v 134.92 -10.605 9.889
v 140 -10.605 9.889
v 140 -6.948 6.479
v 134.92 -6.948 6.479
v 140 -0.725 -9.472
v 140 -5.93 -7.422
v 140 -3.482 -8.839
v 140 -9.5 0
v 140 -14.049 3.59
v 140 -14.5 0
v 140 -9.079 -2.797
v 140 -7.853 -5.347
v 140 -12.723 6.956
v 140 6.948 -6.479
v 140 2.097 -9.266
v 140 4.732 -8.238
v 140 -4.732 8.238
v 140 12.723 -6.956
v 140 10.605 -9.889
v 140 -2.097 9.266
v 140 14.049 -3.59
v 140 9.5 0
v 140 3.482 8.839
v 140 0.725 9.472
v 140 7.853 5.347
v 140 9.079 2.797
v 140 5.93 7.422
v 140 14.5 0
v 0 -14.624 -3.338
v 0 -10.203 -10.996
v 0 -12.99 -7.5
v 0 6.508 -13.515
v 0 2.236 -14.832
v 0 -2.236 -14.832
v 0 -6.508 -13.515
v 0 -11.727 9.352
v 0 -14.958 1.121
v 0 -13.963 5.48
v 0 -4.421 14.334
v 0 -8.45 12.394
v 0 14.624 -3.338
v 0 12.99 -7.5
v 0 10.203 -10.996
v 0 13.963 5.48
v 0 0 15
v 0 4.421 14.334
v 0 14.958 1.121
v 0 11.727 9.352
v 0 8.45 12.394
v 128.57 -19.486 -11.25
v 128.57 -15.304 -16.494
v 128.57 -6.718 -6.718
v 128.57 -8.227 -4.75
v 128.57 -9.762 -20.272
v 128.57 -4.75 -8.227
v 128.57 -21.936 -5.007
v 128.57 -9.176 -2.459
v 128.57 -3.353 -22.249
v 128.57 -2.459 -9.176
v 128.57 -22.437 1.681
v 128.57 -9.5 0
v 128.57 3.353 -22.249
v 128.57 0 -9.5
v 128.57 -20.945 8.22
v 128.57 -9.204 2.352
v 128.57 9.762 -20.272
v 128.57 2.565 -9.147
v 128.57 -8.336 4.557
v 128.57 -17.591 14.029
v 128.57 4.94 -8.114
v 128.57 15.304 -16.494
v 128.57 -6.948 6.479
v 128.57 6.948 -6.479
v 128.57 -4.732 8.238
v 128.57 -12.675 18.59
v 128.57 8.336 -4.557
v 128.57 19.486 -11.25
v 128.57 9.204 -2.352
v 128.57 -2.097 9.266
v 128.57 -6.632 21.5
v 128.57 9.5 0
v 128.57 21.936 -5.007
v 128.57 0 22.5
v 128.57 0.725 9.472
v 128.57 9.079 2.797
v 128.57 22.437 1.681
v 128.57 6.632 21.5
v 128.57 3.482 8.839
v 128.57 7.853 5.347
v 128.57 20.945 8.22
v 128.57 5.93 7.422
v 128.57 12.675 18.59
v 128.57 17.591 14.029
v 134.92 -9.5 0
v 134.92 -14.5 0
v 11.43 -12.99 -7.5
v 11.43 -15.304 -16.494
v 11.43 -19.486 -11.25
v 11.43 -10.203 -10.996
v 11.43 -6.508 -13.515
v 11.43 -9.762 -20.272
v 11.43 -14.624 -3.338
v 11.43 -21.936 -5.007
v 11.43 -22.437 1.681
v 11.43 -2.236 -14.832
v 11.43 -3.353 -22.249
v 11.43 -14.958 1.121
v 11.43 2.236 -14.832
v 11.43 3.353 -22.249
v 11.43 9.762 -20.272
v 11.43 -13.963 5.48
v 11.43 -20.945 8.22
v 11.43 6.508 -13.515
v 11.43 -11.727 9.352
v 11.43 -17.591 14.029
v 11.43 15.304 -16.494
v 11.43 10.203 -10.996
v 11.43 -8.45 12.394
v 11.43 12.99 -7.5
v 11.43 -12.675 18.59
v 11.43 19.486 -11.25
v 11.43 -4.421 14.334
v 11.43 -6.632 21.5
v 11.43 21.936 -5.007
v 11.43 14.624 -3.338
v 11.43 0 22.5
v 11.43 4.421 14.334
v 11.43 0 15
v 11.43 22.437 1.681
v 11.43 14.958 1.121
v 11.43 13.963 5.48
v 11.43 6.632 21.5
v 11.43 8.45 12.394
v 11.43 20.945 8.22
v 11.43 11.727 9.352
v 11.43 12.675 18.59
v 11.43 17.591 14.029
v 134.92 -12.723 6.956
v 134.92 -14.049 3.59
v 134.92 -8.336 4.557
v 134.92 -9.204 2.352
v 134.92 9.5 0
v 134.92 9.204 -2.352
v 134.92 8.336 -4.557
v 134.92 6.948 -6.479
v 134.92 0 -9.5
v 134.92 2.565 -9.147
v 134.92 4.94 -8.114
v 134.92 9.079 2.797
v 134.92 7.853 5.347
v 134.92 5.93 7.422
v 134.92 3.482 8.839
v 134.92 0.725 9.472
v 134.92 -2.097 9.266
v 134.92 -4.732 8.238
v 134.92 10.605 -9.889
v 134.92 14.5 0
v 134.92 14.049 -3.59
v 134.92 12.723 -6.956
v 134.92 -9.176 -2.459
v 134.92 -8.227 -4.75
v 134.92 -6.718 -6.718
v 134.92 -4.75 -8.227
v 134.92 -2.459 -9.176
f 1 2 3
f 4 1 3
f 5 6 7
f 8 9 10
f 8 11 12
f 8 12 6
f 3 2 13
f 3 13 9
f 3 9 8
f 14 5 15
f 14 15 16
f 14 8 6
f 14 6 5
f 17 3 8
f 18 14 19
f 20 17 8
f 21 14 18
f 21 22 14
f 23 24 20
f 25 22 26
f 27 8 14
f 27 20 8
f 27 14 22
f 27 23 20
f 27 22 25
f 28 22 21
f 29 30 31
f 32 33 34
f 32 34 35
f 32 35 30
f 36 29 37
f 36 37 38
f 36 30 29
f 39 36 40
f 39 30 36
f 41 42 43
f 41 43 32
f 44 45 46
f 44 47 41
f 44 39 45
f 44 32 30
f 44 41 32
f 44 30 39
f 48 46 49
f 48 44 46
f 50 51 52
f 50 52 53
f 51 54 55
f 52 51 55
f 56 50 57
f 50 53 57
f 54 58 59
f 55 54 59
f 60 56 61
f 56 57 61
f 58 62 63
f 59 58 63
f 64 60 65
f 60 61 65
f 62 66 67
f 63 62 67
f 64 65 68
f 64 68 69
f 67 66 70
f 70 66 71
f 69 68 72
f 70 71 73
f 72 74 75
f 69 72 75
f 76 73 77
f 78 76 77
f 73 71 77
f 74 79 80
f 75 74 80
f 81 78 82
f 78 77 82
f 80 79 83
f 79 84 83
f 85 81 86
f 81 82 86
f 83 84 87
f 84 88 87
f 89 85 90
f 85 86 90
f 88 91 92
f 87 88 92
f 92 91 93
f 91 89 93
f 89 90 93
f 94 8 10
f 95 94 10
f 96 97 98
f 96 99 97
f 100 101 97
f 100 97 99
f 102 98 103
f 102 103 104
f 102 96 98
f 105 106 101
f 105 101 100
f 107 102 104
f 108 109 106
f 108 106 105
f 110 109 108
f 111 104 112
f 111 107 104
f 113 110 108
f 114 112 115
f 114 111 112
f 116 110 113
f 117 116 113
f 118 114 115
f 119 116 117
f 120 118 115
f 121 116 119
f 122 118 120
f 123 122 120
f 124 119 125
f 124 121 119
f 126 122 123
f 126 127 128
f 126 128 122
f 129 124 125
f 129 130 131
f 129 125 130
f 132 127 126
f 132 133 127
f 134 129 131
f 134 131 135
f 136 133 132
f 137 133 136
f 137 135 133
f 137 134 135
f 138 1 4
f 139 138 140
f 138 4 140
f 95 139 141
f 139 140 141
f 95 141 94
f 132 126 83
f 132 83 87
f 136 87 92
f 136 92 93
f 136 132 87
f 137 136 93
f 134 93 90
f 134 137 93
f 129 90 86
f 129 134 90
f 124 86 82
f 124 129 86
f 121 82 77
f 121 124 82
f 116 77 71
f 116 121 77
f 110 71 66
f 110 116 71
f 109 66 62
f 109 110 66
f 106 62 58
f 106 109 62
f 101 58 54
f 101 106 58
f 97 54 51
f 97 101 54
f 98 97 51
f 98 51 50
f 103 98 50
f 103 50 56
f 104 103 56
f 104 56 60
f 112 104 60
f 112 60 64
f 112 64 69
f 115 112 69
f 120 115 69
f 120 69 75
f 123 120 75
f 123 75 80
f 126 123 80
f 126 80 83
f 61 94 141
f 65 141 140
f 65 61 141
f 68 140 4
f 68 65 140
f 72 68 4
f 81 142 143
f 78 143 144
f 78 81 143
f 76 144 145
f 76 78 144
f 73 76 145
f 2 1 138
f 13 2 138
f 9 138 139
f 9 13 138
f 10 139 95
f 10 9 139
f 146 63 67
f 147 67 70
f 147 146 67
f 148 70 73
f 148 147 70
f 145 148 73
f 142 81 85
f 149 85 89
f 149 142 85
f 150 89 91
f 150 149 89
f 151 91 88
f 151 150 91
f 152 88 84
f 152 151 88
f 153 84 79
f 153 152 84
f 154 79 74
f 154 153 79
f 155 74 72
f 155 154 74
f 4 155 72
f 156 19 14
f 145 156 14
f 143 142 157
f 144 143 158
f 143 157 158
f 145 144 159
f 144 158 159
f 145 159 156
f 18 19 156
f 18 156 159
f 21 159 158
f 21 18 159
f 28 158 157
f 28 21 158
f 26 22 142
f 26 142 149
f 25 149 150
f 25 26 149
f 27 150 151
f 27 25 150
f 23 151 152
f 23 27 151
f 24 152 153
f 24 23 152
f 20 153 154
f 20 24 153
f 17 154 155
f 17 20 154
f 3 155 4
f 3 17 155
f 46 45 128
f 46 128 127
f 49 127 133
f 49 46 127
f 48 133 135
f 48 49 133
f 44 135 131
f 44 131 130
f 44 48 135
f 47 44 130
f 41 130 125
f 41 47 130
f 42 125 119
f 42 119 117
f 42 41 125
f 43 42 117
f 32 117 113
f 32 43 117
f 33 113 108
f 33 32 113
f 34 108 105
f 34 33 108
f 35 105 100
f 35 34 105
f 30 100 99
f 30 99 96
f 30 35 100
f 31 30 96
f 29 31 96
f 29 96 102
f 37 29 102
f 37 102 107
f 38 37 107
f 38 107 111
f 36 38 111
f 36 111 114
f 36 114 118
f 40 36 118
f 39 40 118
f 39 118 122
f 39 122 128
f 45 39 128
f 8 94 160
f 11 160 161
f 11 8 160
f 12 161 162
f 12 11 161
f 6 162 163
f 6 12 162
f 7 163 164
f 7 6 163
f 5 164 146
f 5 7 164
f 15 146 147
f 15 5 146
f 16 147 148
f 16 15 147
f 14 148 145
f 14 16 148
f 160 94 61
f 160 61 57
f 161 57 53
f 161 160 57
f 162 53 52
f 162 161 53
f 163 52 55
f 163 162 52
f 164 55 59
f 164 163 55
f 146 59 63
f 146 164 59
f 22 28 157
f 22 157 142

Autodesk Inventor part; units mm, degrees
ref_plane "YZ Plane" through (0, 0, 0) normal (1, 0, 0) x (0, 1, 0)
ref_plane "XZ Plane" through (0, 0, 0) normal (0, 1, 0) x (-1, 0, 0)
ref_plane "XY Plane" through (0, 0, 0) normal (0, 0, 1) x (1, 0, 0)
sketch "Sketch1" plane through (0, 0, 0) normal (1, 0, 0) x (0, 1, 0)
  circle A0 centre (0, 0) radius 15
  dimension "d0" = 30
extrude "Extrusion1" add sketch "Sketch1" along normal blind 140
sketch "Sketch2" plane through (140, 0, 0) normal (1, 0, 0) x (0, 0, -1)
  circle A0 centre (0, 0) radius 9.5
  circle A1 centre (0, 0) radius 15 projected
  line L0 (0, 15) -> (0, 9.5)
  line L1 (0, -9.5) -> (0, -15)
  line L2 (10.23, 10.9703) -> (6.479, 6.9479)
  line L3 (-10.23, -10.9703) -> (-6.479, -6.9479)
  dimension "d3" = 19
  dimension "d4" = 43
  dimension "d5" = 43
extrude "Extrusion2" cut sketch "Sketch2" against normal blind 11.43 contours A0 L2 A1 L1 | A0 L3 A1 L0
sketch "Sketch3" plane through (128.57, 0, 0) normal (1, 0, 0) x (0, 0, -1)
  circle A0 centre (0, 0) radius 15
  circle A1 centre (0, 0) radius 9.5
  dimension "d22" = 19
  dimension "d23" = 30
extrude "Extrusion3" cut sketch "Sketch3" along normal blind 6.35
sketch "Sketch6" plane through (0, 0, 0) normal (-1, 0, 0) x (0, 0, 1)
  circle A0 centre (0, 0) radius 22.5
  dimension "d16" = 45
extrude "Extrusion6" add sketch "Sketch6" against normal up to surface (128.57 mm away)
sketch "Sketch7" plane through (0, 0, 0) normal (-1, 0, 0) x (0, 0, 1)
  circle A0 centre (0, 0) radius 15
  circle A1 centre (0, 0) radius 22.5
  dimension "d19" = 30
extrude "Extrusion7" cut sketch "Sketch7" against normal blind 11.43
sketch "Sketch8" plane through (140, 0, 0) normal (1, 0, 0) x (0, 0, -1)
  arc A0 (10.23, 10.9703) -> (0, 15) centre (0, 0) ccw projected
  circle A1 centre (0, 0) radius 15
  circle A2 centre (0, 0) radius 14.5
  point P0 (0, 15)
  dimension "d24" = 0.5
extrude "Extrusion8" cut sketch "Sketch8" against normal up to surface (5.08 mm away)
properties part number "spool axle" material "PLA"
